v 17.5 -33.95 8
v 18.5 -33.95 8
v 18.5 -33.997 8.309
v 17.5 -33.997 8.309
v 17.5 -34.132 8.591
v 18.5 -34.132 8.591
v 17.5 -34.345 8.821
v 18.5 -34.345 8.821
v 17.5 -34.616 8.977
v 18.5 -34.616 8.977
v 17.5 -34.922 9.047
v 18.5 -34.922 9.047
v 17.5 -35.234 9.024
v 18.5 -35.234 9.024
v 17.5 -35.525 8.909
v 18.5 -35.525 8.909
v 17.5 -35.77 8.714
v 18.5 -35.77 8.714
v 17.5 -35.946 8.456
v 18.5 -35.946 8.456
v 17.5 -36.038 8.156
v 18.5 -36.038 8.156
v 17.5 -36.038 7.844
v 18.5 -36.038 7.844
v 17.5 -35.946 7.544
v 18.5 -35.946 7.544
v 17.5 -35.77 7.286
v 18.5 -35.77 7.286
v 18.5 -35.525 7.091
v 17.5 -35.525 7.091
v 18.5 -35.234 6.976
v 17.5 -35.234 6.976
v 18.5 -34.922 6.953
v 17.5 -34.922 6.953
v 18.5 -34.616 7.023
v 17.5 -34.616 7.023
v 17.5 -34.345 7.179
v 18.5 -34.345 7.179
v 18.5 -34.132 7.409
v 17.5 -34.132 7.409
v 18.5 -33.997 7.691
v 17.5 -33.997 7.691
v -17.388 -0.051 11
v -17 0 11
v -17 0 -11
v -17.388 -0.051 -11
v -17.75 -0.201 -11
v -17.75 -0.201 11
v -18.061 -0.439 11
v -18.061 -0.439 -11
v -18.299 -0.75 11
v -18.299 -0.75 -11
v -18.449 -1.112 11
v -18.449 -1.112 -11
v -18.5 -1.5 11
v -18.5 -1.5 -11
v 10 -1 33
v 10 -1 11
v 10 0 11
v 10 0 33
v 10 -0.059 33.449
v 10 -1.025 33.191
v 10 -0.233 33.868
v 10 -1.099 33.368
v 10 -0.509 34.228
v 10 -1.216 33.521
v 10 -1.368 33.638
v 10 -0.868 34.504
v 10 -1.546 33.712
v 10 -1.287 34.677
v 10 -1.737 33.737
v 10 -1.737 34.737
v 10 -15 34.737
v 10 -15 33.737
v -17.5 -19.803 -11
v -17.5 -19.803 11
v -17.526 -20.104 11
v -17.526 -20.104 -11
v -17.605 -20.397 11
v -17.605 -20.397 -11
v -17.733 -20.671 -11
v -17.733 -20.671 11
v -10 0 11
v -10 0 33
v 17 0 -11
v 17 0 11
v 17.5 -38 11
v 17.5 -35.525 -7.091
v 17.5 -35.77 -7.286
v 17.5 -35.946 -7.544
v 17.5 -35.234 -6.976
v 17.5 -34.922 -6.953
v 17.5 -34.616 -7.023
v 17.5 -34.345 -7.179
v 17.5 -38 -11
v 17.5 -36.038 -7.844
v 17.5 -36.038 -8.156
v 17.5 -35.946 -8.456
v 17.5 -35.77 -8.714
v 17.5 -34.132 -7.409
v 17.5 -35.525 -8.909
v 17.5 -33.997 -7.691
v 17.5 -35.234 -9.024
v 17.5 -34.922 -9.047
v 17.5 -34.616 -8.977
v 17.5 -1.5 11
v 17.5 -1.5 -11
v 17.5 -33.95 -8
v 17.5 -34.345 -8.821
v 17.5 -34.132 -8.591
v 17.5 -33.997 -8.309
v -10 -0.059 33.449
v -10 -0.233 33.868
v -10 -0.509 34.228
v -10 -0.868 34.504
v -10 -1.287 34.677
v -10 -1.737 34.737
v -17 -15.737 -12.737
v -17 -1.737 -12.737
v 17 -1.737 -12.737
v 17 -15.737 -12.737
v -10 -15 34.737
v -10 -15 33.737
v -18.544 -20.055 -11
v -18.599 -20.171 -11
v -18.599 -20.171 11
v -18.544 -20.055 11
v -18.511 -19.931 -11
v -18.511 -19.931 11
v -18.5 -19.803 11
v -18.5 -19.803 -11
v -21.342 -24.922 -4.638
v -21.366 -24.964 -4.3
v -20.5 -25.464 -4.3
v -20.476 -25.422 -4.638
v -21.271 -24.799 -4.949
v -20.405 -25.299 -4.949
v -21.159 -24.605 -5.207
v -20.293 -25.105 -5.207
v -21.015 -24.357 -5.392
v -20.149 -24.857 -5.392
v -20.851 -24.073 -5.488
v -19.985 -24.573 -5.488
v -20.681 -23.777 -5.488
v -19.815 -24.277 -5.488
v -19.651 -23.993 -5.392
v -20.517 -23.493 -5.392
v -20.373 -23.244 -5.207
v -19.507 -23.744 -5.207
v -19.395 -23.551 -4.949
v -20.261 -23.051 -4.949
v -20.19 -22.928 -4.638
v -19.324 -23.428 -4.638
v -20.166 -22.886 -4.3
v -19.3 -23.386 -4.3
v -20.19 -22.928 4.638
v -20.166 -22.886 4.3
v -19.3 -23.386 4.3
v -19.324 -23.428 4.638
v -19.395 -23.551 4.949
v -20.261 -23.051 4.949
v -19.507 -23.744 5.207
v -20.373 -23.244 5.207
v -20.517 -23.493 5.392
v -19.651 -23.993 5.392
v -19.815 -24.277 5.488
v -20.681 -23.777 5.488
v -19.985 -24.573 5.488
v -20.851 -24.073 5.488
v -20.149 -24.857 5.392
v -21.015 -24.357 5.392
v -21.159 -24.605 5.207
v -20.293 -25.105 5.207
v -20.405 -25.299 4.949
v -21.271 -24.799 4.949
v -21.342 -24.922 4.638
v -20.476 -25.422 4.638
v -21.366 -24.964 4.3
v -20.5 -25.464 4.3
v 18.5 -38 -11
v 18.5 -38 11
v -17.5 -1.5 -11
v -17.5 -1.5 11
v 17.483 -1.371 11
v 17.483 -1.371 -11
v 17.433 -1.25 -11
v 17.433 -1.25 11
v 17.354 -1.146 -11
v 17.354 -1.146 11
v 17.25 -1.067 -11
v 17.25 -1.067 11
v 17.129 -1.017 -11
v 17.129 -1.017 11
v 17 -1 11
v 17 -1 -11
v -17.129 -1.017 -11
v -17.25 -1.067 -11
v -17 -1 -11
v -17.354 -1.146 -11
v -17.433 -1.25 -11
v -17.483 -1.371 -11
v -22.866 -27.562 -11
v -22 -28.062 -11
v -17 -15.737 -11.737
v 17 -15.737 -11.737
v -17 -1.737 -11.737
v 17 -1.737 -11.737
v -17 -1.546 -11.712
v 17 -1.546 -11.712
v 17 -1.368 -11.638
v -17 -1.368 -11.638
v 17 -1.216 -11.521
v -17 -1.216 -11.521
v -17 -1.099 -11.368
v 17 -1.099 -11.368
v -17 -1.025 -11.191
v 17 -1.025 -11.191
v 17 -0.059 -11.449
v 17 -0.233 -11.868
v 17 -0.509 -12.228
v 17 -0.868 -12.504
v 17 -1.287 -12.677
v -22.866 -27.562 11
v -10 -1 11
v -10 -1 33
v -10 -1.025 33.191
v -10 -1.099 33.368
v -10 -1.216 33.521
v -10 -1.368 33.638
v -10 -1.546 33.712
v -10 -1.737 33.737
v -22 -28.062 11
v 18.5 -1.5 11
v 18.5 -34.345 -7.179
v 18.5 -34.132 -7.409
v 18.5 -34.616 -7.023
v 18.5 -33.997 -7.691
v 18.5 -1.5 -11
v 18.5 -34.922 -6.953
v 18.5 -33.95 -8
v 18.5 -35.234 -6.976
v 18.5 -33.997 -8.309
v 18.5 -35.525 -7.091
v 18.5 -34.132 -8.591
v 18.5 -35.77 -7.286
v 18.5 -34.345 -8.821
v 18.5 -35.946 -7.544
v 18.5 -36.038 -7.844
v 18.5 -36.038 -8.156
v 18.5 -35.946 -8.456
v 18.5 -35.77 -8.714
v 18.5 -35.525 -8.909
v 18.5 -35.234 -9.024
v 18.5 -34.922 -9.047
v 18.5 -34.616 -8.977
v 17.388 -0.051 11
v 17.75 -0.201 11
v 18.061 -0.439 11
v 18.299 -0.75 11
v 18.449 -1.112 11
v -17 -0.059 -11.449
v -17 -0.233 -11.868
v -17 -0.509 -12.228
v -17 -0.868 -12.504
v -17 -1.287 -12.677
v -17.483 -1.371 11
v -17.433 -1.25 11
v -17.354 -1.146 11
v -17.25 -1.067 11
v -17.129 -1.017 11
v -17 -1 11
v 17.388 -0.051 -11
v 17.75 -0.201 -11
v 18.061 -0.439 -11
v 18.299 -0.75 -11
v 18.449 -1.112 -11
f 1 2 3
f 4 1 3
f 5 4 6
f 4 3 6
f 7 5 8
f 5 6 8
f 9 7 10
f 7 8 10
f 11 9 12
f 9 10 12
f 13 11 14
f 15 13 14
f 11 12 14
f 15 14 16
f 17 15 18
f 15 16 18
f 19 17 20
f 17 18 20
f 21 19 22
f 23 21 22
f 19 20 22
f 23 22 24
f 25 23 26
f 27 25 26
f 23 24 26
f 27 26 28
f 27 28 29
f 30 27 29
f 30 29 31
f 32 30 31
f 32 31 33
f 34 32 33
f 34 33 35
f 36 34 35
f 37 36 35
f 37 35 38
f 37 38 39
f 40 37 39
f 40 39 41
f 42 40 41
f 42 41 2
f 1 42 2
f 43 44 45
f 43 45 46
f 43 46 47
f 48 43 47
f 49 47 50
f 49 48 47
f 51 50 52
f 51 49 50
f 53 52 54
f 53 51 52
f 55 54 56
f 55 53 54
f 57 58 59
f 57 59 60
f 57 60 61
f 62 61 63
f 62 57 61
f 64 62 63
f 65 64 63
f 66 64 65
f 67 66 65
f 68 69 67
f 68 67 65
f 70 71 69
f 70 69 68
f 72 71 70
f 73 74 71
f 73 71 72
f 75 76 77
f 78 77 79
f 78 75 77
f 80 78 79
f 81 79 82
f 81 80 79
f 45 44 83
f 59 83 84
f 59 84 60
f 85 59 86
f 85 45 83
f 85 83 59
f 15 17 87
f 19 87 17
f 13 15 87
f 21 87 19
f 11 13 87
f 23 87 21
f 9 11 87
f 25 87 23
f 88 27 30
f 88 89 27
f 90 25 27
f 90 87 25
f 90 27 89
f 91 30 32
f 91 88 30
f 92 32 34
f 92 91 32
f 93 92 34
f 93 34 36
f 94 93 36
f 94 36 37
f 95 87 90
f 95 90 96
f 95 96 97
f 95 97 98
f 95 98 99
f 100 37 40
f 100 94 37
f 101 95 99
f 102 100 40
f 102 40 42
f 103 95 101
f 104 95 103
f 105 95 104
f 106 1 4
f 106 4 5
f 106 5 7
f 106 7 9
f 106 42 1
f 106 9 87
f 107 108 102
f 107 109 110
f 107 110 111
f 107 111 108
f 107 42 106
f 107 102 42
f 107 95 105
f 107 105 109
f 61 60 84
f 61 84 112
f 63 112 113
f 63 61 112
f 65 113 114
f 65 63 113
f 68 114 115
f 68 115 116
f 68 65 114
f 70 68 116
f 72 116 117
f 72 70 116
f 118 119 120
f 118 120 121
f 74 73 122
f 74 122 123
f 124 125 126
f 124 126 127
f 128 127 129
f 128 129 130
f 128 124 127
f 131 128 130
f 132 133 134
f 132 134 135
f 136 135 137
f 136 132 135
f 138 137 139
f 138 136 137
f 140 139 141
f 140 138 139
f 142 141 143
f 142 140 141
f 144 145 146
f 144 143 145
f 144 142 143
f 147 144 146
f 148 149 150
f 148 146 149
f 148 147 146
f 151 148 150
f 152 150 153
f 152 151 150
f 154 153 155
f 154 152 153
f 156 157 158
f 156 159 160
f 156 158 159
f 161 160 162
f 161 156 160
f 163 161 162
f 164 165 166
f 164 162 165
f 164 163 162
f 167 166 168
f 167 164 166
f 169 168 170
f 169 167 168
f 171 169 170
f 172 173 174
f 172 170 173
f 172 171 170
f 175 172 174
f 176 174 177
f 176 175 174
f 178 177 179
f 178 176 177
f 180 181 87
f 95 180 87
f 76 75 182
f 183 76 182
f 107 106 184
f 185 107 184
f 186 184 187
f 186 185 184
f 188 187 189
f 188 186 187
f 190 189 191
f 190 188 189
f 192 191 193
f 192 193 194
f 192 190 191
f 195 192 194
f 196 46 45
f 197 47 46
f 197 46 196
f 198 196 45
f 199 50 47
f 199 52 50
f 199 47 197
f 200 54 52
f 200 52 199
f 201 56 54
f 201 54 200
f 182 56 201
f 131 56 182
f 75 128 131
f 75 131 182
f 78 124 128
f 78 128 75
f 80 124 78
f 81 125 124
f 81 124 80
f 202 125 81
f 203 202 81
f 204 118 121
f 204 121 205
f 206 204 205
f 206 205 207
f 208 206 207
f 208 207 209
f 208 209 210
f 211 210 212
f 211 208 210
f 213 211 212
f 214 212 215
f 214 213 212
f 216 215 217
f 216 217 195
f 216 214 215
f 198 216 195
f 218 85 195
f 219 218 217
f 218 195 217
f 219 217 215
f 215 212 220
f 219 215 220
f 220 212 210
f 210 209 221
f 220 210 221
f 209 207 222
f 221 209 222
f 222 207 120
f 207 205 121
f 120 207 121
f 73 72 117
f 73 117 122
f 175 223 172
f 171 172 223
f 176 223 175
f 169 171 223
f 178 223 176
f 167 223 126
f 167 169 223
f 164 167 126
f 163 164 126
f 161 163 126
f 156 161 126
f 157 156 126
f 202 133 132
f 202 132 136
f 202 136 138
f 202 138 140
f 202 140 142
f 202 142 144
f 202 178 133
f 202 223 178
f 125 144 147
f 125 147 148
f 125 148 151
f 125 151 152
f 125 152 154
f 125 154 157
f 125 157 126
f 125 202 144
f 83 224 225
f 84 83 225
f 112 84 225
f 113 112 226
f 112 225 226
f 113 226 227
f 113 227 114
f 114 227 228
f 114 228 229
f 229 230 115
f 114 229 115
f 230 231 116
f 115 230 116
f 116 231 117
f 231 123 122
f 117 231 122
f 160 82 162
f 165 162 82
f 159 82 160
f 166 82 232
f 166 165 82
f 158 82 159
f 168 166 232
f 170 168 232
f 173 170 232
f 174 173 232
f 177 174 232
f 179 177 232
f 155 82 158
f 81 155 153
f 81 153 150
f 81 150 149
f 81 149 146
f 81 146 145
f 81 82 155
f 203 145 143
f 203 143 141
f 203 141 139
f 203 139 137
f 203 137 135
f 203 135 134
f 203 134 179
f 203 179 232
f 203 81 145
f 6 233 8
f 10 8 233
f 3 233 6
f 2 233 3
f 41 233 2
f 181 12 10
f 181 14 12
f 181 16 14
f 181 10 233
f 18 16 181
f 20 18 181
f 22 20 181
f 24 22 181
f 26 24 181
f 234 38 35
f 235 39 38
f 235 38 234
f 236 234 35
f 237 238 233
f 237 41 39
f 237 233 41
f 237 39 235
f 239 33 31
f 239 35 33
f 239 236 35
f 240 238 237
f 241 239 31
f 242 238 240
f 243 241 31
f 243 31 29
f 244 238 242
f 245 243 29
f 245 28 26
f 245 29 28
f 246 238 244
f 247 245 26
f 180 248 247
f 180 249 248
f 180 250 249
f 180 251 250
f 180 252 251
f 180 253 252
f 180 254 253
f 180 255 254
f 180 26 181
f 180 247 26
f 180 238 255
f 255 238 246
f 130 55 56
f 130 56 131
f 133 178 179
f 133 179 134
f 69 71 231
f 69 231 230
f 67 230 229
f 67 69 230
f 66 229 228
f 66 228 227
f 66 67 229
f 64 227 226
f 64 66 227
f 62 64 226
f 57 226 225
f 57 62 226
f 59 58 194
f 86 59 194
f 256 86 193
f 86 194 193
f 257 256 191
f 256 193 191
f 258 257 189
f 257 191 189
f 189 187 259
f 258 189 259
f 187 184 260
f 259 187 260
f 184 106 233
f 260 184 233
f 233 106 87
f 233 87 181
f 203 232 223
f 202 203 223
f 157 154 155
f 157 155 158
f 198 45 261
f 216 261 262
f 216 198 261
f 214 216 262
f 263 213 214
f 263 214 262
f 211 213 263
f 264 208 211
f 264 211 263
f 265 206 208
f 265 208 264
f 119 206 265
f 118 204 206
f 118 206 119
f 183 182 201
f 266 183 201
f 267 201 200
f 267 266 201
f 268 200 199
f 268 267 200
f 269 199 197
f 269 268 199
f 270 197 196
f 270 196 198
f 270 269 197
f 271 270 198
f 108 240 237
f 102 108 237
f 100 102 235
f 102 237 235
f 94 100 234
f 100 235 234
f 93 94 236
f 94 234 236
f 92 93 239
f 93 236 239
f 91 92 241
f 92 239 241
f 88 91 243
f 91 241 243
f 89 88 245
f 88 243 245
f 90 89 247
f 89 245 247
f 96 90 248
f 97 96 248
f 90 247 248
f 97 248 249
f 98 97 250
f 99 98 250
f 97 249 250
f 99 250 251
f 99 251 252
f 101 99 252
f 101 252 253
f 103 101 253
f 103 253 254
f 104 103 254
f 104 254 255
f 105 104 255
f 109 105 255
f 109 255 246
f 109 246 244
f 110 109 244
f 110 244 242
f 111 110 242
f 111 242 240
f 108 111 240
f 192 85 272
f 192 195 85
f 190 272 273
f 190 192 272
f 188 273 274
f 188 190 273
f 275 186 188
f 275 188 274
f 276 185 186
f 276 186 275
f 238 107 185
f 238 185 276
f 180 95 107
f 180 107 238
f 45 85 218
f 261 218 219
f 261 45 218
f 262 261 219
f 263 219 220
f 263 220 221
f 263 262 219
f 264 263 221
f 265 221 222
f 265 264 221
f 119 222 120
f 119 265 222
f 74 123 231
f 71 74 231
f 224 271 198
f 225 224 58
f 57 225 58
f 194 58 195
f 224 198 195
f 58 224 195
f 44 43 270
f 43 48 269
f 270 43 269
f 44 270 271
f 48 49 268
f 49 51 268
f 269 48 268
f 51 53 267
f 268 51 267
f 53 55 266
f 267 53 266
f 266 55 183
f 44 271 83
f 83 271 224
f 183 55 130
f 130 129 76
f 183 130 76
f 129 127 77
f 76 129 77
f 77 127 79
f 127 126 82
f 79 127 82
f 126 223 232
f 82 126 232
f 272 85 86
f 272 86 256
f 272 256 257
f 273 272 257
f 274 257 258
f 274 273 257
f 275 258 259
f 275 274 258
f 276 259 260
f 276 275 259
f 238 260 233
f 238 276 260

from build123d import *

# Parameters (mm, degrees)
SKETCH_1_W                       = 35
SKETCH_1_H                       = 22
SM_BASE_FLANGE_1_DEPTH           = 1
SM_EDGE_FLANGE_1_STRIP_W         = 5
SM_EDGE_FLANGE_1_STRIP_H         = 1
SM_EDGE_FLANGE_1_STRIP_CUT_DEPTH = 22
SM_EDGE_FLANGE_1_DEPTH           = 22
SM_EDGE_FLANGE_2_STRIP_W         = 5
SM_EDGE_FLANGE_2_STRIP_H         = 1
SM_EDGE_FLANGE_2_STRIP_CUT_DEPTH = 22
SM_EDGE_FLANGE_2_DEPTH           = 22
SM_EDGE_FLANGE_3_DEPTH           = 34
EXTRUDE_1_DEPTH                  = 22
SM_EDGE_FLANGE_4_DEPTH           = 20
SM_EDGE_FLANGE_5_STRIP_CUT_DEPTH = 22
SM_EDGE_FLANGE_5_DEPTH           = 22
CUT_EXTRUDE_1_DEPTH              = 22
SKETCH_27_R                      = 1.05
CUT_EXTRUDE_2_DEPTH              = 22


# Sheet-metal steps are written as plain solids
with BuildPart() as part:
    # Sketch 1 → 基体-法兰1 (new body)
    with BuildSketch(Plane(origin=(0, 0, 0), x_dir=(1, 0, 0), z_dir=(0, 1, 0))):
        Rectangle(SKETCH_1_W, SKETCH_1_H)
    extrude(amount=-SM_BASE_FLANGE_1_DEPTH)

    # 边线-法兰1 strip (across the edge) → 边线-法兰1 strip cut (cut)
    with BuildSketch(Plane(origin=(-17.5, -1, 11), x_dir=(1, 0, 0), z_dir=(0, 0, -1))):
        with Locations((-2, -0.5)):
            Rectangle(SM_EDGE_FLANGE_1_STRIP_W, SM_EDGE_FLANGE_1_STRIP_H)
    extrude(amount=SM_EDGE_FLANGE_1_STRIP_CUT_DEPTH, mode=Mode.SUBTRACT)

    # 边线-法兰1 section (across the edge) → 边线-法兰1 (add)
    with BuildSketch(Plane(origin=(-17.5, -1, 11), x_dir=(1, 0, 0), z_dir=(0, 0, -1))):
        with BuildLine():
            Line((-1, 0.5), (-1, 19))
            Line((-1, 19), (0, 19))
            Line((0, 19), (0, 0.5))
            ThreePointArc((0, 0.5), (0.146446609, 0.146446609), (0.5, 0))
            Line((0.5, 0), (0.5, -1))
            ThreePointArc((0.5, -1), (-0.560660172, -0.560660172), (-1, 0.5))
        make_face()
    extrude(amount=SM_EDGE_FLANGE_1_DEPTH)

    # 边线-法兰2 strip (across the edge) → 边线-法兰2 strip cut (cut)
    with BuildSketch(Plane(origin=(17.5, -1, -11), x_dir=(-1, 0, 0), z_dir=(0, 0, 1))):
        with Locations((-2, -0.5)):
            Rectangle(SM_EDGE_FLANGE_2_STRIP_W, SM_EDGE_FLANGE_2_STRIP_H)
    extrude(amount=SM_EDGE_FLANGE_2_STRIP_CUT_DEPTH, mode=Mode.SUBTRACT)

    # 边线-法兰2 section (across the edge) → 边线-法兰2 (add)
    with BuildSketch(Plane(origin=(17.5, -1, -11), x_dir=(-1, 0, 0), z_dir=(0, 0, 1))):
        with BuildLine():
            Line((-1, 0.5), (-1, 37))
            Line((-1, 37), (0, 37))
            Line((0, 37), (0, 0.5))
            ThreePointArc((0, 0.5), (0.146446609, 0.146446609), (0.5, 0))
            Line((0.5, 0), (0.5, -1))
            ThreePointArc((0.5, -1), (-0.560660172, -0.560660172), (-1, 0.5))
        make_face()
    extrude(amount=SM_EDGE_FLANGE_2_DEPTH)

    # 边线-法兰3 section (across the edge) → 边线-法兰3 (add)
    with BuildSketch(Plane(origin=(-17, -1, -11.7366), x_dir=(0, 0, 1), z_dir=(1, 0, 0))):
        with BuildLine():
            Line((-1, 0.7366), (-1, 14.7366))
            Line((-1, 14.7366), (0, 14.7366))
            Line((0, 14.7366), (0, 0.7366))
            ThreePointArc((0, 0.7366), (0.215745145, 0.215745145), (0.7366, 0))
            Line((0.7366, 0), (0.7366, -1))
            ThreePointArc((0.7366, -1), (-0.491361636, -0.491361636), (-1, 0.7366))
        make_face()
    extrude(amount=SM_EDGE_FLANGE_3_DEPTH)

    # 草图19 → 凸台-拉伸1 (add)
    with BuildSketch(Plane.XY.offset(11)):
        Polygon((0, 0), (10, 0), (10, -1), (-10, -1), (-10, 0), align=None)
    extrude(amount=EXTRUDE_1_DEPTH)

    # 边线-法兰4 section (across the edge) → 边线-法兰4 (add)
    with BuildSketch(Plane(origin=(10, -1, 33.7366), x_dir=(0, 0, -1), z_dir=(-1, 0, 0))):
        with BuildLine():
            Line((-1, 0.7366), (-1, 14))
            Line((-1, 14), (0, 14))
            Line((0, 14), (0, 0.7366))
            ThreePointArc((0, 0.7366), (0.215745145, 0.215745145), (0.7366, 0))
            Line((0.7366, 0), (0.7366, -1))
            ThreePointArc((0.7366, -1), (-0.491361636, -0.491361636), (-1, 0.7366))
        make_face()
    extrude(amount=SM_EDGE_FLANGE_4_DEPTH)

    # 边线-法兰5 strip (across the edge) → 边线-法兰5 strip cut (cut)
    with BuildSketch(Plane(origin=(-18.5, -20, -11), x_dir=(-0.8660254037844398, 0.4999999999999981, 0), z_dir=(0, 0, 1))):
        Polygon((-3.503939716, 4.069001615), (-0.767339716, -0.670928625), (0.098685688, -0.170928625), (-2.637914312, 4.569001615), align=None)
    extrude(amount=SM_EDGE_FLANGE_5_STRIP_CUT_DEPTH, mode=Mode.SUBTRACT)

    # 边线-法兰5 section (across the edge) → 边线-法兰5 (add)
    with BuildSketch(Plane(origin=(-18.5, -20, -11), x_dir=(-0.8660254037844398, 0.4999999999999981, 0), z_dir=(0, 0, 1))):
        with BuildLine():
            Line((-1, 0.197371375), (-1, 8.732050808))
            Line((-1, 8.732050808), (0, 8.732050808))
            Line((0, 8.732050808), (0, 0.197371375))
            ThreePointArc((0, 0.197371375), (0.025099036, 0.006725267), (0.098685688, -0.170928625))
            Line((0.098685688, -0.170928625), (-0.767339716, -0.670928625))
            ThreePointArc((-0.767339716, -0.670928625), (-0.94082679, -0.252093779), (-1, 0.197371375))
        make_face()
    extrude(amount=SM_EDGE_FLANGE_5_DEPTH)

    # 草图26 → 切除-拉伸1 (cut)
    with BuildSketch(Plane(origin=(-5.214745962, 3.010734985, 0), x_dir=(0, 0, 1), z_dir=(-0.8660254037844398, 0.49999999999999806, 0))):
        with BuildLine():
            Line((-4.3, -29.902558883), (4.3, -29.902558883))
            ThreePointArc((4.3, -29.902558883), (5.5, -31.102558883), (4.3, -32.302558883))
            Line((4.3, -32.302558883), (-4.3, -32.302558883))
            ThreePointArc((-4.3, -32.302558883), (-5.5, -31.102558883), (-4.3, -29.902558883))
        make_face()
    extrude(amount=-CUT_EXTRUDE_1_DEPTH, mode=Mode.SUBTRACT)

    # 草图27 → 切除-拉伸2 (cut)
    with BuildSketch(Plane(origin=(18.5, 0, 0), x_dir=(0, 0, -1), z_dir=(1, 0, 0))):
        with Locations(Location((8, -35, 0), (0, 0, 90))):
            Circle(SKETCH_27_R)
        with Locations(Location((-8, -35, 0), (0, 0, 90))):
            Circle(SKETCH_27_R)
    extrude(amount=-CUT_EXTRUDE_2_DEPTH, mode=Mode.SUBTRACT)


solid = part.part
